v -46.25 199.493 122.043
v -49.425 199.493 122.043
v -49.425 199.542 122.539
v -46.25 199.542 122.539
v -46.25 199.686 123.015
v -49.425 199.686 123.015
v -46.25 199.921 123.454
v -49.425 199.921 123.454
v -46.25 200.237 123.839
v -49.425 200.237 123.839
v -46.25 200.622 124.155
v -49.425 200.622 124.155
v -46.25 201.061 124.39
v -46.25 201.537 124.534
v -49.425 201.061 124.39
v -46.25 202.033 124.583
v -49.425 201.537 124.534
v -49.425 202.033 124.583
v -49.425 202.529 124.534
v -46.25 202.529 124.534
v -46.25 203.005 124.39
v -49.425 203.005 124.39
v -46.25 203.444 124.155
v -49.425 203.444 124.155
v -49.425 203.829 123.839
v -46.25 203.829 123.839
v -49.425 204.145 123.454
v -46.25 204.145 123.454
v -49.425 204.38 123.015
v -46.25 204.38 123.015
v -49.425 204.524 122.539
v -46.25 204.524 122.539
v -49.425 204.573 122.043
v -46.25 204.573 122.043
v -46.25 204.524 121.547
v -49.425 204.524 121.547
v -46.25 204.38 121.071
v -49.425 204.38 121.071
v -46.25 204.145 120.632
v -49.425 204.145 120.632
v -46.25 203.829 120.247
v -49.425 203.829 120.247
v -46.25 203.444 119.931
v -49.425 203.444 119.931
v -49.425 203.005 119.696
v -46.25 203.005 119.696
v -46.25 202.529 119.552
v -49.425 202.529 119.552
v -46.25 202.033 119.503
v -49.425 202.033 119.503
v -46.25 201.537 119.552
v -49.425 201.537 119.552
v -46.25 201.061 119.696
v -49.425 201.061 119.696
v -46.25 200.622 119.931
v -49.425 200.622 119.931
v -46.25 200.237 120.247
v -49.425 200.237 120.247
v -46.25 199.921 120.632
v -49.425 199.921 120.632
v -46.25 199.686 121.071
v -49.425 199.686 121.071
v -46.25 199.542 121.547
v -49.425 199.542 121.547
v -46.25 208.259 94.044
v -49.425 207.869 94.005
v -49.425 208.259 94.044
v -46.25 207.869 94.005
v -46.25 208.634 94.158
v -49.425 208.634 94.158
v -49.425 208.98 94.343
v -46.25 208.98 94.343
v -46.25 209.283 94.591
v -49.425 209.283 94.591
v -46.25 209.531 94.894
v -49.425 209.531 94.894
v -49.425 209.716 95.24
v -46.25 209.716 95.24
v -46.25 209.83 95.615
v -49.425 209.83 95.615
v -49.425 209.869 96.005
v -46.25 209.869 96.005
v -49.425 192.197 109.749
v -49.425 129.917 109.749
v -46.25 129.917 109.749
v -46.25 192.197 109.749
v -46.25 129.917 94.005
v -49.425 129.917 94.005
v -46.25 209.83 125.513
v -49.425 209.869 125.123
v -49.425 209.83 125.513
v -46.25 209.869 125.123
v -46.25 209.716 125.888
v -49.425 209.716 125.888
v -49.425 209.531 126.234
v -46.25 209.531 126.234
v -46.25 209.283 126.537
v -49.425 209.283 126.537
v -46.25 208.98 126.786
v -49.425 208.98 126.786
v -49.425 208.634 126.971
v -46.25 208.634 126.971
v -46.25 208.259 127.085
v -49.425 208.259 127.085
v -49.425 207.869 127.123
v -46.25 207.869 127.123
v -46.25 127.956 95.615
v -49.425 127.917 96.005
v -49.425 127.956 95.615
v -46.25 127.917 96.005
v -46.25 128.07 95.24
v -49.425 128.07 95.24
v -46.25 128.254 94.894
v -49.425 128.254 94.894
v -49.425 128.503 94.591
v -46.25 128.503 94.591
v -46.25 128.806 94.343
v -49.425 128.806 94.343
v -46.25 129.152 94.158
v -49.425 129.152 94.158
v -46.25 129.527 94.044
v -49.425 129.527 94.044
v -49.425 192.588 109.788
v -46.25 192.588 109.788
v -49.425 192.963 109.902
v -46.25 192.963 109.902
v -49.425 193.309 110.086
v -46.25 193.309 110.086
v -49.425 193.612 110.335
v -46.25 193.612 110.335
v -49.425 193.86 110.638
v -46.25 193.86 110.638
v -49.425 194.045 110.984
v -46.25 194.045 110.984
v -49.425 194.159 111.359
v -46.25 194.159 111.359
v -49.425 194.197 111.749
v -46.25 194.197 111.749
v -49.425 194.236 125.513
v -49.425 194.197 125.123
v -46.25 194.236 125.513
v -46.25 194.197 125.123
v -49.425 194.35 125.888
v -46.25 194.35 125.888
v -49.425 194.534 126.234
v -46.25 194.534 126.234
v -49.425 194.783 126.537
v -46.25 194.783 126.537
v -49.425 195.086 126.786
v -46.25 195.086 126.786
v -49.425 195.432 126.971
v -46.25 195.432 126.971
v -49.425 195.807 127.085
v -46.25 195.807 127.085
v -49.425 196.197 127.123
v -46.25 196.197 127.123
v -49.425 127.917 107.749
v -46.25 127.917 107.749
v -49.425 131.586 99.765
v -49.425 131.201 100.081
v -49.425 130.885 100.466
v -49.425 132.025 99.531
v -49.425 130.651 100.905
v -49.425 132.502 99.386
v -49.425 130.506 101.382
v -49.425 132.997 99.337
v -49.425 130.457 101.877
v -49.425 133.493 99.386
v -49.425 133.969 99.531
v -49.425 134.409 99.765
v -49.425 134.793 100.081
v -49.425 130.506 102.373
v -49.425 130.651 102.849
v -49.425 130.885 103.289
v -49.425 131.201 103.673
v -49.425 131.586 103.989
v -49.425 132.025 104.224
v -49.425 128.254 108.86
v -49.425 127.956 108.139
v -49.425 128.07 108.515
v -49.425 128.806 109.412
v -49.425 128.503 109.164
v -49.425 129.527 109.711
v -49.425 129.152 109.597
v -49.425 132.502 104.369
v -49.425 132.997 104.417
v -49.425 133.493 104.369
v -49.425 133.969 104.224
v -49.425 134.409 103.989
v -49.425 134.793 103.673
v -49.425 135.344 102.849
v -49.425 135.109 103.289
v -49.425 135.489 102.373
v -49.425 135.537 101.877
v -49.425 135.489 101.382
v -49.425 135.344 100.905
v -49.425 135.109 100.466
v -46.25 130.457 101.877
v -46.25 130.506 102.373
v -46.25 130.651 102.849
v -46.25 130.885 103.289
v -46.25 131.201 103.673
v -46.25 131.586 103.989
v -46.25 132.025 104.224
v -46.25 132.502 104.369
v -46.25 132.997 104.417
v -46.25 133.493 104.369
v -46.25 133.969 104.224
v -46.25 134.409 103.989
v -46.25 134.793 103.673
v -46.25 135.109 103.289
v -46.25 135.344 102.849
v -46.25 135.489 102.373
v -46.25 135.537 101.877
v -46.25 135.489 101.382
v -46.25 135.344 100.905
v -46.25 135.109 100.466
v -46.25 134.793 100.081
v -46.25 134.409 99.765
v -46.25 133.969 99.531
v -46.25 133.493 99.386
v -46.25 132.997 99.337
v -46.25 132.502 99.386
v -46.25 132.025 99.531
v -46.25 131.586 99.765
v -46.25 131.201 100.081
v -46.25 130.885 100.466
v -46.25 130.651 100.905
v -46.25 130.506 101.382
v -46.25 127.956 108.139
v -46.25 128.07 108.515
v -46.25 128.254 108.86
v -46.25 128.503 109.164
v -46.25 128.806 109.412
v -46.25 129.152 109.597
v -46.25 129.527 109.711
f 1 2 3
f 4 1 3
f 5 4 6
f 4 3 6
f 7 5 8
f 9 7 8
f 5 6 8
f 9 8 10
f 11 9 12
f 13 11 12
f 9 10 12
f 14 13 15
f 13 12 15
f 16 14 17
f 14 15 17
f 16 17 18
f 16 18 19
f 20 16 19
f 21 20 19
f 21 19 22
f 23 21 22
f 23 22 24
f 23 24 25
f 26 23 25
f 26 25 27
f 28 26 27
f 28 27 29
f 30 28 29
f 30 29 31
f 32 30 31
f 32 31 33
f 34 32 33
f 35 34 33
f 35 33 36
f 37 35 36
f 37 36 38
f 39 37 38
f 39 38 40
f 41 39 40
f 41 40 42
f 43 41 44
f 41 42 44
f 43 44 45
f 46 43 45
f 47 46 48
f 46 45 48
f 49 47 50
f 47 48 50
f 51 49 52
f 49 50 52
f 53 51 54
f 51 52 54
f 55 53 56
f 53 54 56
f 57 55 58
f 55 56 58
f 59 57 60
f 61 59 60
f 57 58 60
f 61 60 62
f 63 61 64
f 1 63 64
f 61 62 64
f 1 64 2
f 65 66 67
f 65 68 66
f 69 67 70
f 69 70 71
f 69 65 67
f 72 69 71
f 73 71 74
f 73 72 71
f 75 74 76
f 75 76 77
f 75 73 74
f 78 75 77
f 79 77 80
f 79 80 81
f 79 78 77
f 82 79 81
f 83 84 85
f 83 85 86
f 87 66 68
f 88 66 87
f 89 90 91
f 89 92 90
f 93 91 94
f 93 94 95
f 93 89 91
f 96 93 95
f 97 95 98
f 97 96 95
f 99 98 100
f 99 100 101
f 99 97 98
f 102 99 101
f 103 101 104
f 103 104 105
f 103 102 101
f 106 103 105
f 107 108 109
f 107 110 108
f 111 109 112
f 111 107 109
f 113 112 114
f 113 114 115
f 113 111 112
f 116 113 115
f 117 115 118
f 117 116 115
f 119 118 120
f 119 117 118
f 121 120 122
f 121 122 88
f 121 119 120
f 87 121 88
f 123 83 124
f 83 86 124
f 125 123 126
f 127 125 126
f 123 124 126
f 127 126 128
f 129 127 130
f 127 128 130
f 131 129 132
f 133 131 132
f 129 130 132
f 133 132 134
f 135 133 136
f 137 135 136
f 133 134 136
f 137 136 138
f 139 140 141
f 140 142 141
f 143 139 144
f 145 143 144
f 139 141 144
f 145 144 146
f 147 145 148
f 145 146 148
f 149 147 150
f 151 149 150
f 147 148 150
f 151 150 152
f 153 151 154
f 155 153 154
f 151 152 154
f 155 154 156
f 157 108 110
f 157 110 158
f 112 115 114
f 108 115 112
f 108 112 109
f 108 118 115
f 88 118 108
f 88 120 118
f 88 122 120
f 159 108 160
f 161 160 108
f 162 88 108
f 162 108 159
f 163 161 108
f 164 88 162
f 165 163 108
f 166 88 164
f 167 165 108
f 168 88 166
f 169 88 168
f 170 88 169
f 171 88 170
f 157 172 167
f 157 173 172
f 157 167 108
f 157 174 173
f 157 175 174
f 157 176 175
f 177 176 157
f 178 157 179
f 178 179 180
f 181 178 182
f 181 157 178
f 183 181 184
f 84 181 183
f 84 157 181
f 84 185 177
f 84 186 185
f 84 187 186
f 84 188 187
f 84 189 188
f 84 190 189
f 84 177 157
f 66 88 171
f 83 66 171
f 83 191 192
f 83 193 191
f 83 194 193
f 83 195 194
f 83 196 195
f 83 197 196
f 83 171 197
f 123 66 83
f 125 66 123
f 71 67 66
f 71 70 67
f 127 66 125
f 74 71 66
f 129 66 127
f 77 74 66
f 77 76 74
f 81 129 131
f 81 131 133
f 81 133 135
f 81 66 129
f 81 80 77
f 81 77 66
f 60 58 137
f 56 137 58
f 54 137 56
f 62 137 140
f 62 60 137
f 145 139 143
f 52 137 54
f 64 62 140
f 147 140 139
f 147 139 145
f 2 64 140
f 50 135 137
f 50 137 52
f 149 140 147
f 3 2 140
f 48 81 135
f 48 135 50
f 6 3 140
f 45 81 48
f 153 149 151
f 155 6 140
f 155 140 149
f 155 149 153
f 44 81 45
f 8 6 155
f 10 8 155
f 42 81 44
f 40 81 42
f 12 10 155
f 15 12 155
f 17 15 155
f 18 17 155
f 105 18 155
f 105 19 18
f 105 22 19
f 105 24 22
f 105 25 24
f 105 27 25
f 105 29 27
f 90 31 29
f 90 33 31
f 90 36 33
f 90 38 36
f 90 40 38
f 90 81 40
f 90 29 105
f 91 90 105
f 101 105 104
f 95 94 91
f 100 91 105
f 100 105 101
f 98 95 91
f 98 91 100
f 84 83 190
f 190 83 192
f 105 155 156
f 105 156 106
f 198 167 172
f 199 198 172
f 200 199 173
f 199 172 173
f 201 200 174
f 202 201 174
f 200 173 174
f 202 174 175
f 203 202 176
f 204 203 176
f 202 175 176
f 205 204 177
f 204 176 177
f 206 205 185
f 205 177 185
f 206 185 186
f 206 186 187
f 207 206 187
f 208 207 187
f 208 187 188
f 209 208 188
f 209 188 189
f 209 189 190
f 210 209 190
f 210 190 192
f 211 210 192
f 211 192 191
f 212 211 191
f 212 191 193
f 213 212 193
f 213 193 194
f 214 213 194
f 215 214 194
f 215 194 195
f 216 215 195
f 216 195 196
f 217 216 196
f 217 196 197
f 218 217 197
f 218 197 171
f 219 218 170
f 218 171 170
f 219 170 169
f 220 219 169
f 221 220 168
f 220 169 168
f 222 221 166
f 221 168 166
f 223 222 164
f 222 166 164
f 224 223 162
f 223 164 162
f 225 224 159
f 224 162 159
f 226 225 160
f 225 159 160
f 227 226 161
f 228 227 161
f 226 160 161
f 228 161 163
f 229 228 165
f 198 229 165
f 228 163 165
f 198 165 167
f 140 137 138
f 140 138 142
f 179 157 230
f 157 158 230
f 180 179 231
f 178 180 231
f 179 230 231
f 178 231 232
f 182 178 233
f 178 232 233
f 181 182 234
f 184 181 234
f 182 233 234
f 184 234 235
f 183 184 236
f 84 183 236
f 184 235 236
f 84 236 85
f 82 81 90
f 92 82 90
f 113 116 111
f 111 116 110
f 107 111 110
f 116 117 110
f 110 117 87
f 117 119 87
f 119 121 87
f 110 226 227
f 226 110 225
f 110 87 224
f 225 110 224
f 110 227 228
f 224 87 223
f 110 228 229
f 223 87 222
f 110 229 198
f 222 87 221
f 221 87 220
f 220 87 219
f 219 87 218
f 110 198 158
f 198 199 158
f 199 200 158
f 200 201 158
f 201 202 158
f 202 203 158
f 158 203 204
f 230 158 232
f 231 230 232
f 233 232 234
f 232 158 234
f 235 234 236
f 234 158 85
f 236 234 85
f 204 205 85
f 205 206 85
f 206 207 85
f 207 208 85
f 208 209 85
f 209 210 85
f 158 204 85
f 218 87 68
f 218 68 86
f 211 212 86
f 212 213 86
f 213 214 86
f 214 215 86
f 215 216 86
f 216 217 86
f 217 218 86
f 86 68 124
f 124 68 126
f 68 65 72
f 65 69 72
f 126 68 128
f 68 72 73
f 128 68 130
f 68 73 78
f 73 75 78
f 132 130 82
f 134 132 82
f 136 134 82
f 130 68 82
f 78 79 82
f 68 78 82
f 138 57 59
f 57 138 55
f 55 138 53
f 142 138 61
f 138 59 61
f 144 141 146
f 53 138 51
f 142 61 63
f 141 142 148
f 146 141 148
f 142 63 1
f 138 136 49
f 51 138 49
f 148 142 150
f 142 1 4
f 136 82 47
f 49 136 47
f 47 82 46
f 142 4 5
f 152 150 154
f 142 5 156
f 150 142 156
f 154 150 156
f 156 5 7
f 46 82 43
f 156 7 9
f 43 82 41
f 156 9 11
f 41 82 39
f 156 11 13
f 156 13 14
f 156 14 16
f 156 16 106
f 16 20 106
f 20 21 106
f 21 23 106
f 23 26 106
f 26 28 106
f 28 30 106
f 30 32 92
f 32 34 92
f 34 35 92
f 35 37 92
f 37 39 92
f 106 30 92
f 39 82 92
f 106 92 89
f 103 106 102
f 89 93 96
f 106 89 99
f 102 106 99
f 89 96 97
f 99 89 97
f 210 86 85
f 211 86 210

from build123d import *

# Parameters (mm, degrees)
BASE_FLANGE1_DEPTH = 3.175
SKETCH9_R          = 2.54
CUT_EXTRUDE2_DEPTH = 246.387748173
FILLET1_R          = 2


# Sheet-metal steps are written as plain solids
with BuildPart() as part:
    # Sketch2 → Base-Flange1 (new body)
    with BuildSketch(Plane(origin=(-49.425032983, 0, 0), x_dir=(0, 0, -1), z_dir=(1, 0, 0))):
        Polygon((-94.005448243, 127.917372069), (-109.749301699, 127.917372069), (-109.749301699, 194.197401704), (-127.122990112, 194.197401704), (-127.122990112, 209.868558182), (-109.749301699, 209.868558182), (-94.005448243, 209.868558182), align=None)
    extrude(amount=BASE_FLANGE1_DEPTH)

    # Sketch9 → Cut-Extrude2 (cut, through all)
    with BuildSketch(Plane.ZY.offset(49.425032983)):
        with Locations(Location((122.042990112, 202.032979943, 0), (0, 0, 270))):
            Circle(SKETCH9_R)
        with Locations(Location((101.877374971, 132.997372069, 0), (0, 0, 270))):
            Circle(SKETCH9_R)
    extrude(amount=-CUT_EXTRUDE2_DEPTH, mode=Mode.SUBTRACT)

    # Fillet1
    fillet1_edges = [part.edges().sort_by_distance(p)[0] for p in [
        (-47.837532983, 127.917372069, 94.005448243),
        (-47.837532983, 127.917372069, 109.749301699),
        (-47.837532983, 194.197401704, 109.749301699),
        (-47.837532983, 194.197401704, 127.122990112),
        (-47.837532983, 209.868558182, 127.122990112),
        (-47.837532983, 209.868558182, 94.005448243),
    ]]
    fillet(fillet1_edges, radius=FILLET1_R)


solid = part.part
